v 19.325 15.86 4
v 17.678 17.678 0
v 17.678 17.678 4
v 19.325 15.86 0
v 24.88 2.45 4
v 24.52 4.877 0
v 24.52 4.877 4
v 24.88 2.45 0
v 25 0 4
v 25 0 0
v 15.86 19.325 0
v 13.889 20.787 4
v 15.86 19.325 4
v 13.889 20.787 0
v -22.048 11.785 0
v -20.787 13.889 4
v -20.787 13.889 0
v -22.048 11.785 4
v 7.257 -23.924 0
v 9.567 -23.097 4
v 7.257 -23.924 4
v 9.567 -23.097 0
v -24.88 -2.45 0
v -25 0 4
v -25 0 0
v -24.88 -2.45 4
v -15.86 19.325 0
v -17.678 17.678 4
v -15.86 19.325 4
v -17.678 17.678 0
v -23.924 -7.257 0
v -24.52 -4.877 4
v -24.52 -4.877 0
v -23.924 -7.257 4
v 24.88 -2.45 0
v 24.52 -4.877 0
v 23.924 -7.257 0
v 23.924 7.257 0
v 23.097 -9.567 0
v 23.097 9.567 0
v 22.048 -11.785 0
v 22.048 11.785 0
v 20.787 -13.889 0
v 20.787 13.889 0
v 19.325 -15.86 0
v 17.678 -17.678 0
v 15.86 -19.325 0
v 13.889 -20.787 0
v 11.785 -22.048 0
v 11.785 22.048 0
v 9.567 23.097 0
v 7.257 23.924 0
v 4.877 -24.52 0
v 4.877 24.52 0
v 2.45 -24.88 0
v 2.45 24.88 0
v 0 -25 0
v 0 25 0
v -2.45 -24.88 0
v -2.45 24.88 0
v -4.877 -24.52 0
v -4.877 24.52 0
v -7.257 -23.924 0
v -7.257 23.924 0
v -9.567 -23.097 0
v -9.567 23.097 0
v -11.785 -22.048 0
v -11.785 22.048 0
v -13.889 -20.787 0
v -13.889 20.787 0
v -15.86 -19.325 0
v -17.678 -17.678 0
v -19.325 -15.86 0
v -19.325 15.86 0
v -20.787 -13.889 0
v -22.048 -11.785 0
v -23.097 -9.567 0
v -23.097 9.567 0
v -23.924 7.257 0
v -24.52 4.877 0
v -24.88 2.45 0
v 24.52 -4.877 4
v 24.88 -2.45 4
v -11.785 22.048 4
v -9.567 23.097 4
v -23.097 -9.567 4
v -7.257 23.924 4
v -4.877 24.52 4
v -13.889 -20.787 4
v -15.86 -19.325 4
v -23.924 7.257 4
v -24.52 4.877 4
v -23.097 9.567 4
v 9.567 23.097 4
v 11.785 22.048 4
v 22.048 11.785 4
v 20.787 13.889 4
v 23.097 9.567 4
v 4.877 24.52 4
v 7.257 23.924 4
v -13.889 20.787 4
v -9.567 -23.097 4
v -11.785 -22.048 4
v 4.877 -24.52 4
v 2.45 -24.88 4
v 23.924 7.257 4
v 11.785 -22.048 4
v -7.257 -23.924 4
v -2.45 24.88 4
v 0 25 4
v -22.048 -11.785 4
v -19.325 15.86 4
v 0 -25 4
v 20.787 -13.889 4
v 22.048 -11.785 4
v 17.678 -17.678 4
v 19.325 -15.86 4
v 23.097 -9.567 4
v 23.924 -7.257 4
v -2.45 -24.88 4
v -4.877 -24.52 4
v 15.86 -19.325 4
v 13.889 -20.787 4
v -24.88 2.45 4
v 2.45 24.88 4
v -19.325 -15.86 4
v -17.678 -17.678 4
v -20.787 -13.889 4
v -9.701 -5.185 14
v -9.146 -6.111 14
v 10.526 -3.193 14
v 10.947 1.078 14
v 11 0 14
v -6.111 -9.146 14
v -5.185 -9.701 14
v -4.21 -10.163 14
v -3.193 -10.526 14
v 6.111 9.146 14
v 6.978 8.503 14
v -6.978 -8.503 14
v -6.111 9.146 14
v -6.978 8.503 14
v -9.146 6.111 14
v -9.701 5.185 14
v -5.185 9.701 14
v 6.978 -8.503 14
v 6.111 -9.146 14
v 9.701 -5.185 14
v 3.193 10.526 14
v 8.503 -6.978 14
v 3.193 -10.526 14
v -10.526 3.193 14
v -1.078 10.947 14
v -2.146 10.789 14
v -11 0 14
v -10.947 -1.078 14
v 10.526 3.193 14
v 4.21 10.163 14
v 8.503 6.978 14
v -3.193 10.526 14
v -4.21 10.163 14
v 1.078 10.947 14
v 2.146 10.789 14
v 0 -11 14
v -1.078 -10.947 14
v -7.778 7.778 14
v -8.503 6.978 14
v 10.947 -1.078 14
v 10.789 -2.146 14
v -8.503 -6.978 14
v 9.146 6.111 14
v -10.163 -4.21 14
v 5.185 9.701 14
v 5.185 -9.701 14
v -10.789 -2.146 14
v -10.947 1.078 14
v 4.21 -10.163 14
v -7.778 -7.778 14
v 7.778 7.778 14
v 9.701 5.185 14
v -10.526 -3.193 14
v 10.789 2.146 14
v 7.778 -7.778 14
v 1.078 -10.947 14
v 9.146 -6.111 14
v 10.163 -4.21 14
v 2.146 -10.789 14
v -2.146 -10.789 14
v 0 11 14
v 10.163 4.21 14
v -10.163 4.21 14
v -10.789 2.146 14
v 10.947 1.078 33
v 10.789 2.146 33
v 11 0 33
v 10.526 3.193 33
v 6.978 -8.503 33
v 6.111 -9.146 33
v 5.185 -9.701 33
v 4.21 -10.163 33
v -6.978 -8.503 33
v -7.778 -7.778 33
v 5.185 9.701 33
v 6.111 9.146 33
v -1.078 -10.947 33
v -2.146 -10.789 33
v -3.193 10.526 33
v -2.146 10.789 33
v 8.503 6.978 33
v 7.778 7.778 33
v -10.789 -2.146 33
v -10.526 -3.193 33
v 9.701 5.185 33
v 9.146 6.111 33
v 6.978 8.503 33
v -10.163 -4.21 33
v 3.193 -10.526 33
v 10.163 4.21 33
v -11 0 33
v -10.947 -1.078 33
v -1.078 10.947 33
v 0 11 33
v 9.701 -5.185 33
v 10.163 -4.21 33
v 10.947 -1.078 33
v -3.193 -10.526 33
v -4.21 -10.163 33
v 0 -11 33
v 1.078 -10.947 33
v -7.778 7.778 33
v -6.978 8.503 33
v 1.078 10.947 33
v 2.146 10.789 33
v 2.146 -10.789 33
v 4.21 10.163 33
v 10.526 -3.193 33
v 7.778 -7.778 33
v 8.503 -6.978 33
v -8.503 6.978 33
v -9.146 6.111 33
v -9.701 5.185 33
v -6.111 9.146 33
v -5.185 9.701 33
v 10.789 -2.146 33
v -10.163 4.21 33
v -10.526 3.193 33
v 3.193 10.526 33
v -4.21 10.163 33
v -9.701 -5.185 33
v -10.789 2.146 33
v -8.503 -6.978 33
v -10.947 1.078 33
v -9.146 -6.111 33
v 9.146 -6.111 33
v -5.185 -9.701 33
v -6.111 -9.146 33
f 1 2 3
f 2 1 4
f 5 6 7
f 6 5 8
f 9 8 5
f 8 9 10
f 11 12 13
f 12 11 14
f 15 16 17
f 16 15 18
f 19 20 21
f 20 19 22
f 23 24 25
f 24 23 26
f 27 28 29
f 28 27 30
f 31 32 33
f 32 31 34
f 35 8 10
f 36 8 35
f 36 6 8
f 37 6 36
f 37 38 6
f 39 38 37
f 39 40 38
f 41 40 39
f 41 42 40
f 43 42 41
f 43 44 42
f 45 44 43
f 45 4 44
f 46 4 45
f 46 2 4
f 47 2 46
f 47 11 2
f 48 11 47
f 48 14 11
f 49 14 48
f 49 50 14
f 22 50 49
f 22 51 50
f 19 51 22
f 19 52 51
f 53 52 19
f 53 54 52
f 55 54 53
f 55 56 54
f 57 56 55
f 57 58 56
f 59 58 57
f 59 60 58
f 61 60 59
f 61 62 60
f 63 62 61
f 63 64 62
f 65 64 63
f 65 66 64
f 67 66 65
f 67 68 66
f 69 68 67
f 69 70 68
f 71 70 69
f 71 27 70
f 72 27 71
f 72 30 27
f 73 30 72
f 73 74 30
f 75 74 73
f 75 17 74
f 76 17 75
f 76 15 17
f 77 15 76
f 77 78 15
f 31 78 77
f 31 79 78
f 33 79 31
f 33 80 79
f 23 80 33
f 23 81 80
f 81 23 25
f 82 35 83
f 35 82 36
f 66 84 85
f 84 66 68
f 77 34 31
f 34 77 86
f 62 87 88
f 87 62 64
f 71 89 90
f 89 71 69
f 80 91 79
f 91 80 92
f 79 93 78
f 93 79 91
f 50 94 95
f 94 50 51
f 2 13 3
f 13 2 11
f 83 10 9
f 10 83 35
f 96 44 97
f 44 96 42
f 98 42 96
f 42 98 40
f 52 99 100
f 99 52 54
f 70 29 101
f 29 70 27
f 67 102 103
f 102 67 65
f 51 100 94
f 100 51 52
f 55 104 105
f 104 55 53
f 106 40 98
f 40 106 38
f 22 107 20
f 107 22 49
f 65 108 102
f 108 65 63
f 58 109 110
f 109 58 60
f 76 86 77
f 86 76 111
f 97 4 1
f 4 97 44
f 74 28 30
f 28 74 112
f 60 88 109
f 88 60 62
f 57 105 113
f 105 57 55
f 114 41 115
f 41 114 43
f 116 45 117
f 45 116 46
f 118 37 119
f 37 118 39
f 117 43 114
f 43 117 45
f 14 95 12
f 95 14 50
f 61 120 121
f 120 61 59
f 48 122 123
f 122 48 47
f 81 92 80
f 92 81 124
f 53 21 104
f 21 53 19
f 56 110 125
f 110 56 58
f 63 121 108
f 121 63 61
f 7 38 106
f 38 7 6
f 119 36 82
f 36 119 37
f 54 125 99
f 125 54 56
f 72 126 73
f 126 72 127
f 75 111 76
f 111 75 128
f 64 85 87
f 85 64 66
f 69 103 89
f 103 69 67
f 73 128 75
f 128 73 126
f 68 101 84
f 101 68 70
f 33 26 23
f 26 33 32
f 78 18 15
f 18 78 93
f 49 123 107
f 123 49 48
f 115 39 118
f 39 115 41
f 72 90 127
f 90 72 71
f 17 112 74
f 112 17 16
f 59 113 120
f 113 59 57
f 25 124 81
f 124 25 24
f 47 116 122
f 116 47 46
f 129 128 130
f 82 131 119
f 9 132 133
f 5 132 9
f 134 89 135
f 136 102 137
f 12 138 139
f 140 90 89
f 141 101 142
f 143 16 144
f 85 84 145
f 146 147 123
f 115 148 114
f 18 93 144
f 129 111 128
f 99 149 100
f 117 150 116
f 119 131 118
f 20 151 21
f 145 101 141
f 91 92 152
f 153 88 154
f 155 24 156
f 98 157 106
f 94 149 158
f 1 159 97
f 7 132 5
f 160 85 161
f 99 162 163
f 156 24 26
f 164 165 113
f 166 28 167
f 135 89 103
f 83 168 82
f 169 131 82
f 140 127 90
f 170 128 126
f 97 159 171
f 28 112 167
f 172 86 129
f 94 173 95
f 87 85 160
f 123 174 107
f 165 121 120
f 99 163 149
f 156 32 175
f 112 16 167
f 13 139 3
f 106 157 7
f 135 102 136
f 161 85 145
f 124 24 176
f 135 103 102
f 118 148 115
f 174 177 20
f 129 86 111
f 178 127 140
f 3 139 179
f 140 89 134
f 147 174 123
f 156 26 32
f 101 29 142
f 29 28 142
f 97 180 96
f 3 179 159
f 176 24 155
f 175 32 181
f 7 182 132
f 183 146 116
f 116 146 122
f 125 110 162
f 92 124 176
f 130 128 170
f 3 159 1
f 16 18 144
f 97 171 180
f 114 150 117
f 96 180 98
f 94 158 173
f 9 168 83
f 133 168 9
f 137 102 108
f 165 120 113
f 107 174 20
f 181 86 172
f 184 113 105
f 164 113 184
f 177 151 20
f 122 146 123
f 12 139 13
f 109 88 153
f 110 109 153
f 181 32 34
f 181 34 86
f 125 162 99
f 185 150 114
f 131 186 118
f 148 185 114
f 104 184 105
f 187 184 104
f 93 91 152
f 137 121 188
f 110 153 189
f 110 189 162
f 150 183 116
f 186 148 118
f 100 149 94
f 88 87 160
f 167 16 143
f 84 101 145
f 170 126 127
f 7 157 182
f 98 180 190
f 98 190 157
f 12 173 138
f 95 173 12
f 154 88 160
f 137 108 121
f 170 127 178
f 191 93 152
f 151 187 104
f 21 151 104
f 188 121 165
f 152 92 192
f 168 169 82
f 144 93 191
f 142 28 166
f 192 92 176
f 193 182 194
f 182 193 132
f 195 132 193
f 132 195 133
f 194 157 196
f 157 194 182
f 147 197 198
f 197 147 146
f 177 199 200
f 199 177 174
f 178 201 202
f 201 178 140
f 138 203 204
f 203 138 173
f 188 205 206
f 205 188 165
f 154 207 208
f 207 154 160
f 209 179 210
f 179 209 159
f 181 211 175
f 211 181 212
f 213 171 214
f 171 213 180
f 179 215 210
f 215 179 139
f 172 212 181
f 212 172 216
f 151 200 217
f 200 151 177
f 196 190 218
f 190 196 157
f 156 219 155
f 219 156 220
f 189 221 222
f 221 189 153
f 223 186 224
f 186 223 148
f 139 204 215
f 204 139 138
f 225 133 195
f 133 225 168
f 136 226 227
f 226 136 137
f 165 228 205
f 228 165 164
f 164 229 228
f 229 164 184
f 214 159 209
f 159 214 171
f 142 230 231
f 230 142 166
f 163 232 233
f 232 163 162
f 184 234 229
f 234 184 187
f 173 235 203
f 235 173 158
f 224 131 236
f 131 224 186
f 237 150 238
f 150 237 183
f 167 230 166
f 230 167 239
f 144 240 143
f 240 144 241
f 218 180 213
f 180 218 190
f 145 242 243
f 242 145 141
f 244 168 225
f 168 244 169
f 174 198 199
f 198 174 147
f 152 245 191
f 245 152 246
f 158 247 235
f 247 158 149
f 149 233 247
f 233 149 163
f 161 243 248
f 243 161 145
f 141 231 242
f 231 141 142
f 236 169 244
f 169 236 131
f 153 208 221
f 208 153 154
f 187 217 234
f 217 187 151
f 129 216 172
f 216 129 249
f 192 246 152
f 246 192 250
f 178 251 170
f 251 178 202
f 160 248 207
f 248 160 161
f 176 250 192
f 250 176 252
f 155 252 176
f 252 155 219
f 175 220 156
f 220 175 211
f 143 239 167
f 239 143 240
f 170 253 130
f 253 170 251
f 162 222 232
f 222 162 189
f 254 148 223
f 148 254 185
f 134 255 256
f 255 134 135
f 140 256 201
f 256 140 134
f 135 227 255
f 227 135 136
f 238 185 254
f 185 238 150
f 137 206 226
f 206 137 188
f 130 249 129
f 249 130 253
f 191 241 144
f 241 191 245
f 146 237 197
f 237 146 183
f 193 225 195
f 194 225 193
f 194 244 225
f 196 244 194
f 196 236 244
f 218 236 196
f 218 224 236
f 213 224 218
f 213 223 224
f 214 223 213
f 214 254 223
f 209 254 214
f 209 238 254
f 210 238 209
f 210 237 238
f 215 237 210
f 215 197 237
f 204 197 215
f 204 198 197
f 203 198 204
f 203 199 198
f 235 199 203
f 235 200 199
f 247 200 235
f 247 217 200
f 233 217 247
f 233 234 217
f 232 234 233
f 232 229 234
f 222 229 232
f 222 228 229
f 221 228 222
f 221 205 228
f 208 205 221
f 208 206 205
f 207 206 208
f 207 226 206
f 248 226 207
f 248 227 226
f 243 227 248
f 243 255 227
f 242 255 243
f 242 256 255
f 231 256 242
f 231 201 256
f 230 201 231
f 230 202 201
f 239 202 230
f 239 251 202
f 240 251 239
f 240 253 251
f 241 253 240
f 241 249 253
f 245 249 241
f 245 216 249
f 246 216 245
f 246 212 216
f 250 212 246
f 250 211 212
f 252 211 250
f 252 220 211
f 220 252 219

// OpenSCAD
// Dimensions (mm) - measured with calipers
base_dia = 50;
base_h = 4;
cone_top_dia = 50;
cone_bot_dia = 22;
cone_h = 10; // z=4 to z=14
col_dia = 22;
col_h = 19; // z=14 to z=33
seat_dia = 11;
seat_h = 10; // z=33 down to z=23
tip_dia = 3;
tip_z = 6;
window_w = 4;
window_z1 = 18;
window_z2 = 30;

$fn = 64;

// Base disc
translate([0, 0, 0])
  cylinder(h = base_h, r = base_dia / 2, center = false);

// Cone from z=4 to z=14
translate([0, 0, base_h])
  cylinder(h = cone_h, r1 = cone_top_dia / 2, r2 = cone_bot_dia / 2, center = false);

// Column from z=14 to z=33
translate([0, 0, base_h + cone_h])
  cylinder(h = col_h, r = col_dia / 2, center = false);

// Tube seat (cylindrical part) from z=23 to z=33
translate([0, 0, tip_z + seat_h])
  cylinder(h = seat_h, r = seat_dia / 2, center = false);

// Tube seat (conical part) from z=6 to z=23
// This cone narrows from seat_dia at z=23 to tip_dia at z=6
cone_seat_h = 23 - tip_z;
translate([0, 0, tip_z])
  cylinder(h = cone_seat_h, r1 = tip_dia / 2, r2 = seat_dia / 2, center = false);

// Viewing window cutout on +X side
// The window is 4mm wide in Y, from z=18 to z=30
// It cuts through the column wall on the +X side
// Column radius is col_dia/2 = 11mm
// Window extends from the seat (r=5.5mm) to outside (r=11mm)
// The previous code used a cube which did not account for the hole inside the seat.
// We need to cut a slot that goes from the outer surface to the inner seat surface.
// The seat radius is seat_dia/2 = 5.5mm.
// The column radius is col_dia/2 = 11mm.
// The window is on the +X side.
// We create a difference to cut the window.

difference() {
    // Union of all solid parts
    union() {
        // Base disc
        translate([0, 0, 0])
          cylinder(h = base_h, r = base_dia / 2, center = false);

        // Cone from z=4 to z=14
        translate([0, 0, base_h])
          cylinder(h = cone_h, r1 = cone_top_dia / 2, r2 = cone_bot_dia / 2, center = false);

        // Column from z=14 to z=33
        translate([0, 0, base_h + cone_h])
          cylinder(h = col_h, r = col_dia / 2, center = false);

        // Tube seat (cylindrical part) from z=23 to z=33
        translate([0, 0, tip_z + seat_h])
          cylinder(h = seat_h, r = seat_dia / 2, center = false);

        // Tube seat (conical part) from z=6 to z=23
        translate([0, 0, tip_z])
          cylinder(h = cone_seat_h, r1 = tip_dia / 2, r2 = seat_dia / 2, center = false);
    }

    // Cut out the viewing window
    // The window is a slot on the +X side.
    // It spans Y from -window_w/2 to +window_w/2.
    // It spans Z from window_z1 to window_z2.
    // It spans X from the inner seat radius to the outer column radius + margin.
    // Inner radius = seat_dia/2 = 5.5
    // Outer radius = col_dia/2 = 11
    // We extend the cut slightly past the outer surface to ensure clean cut.
    
    translate([seat_dia / 2, -window_w / 2, window_z1])
      cube([col_dia / 2 - seat_dia / 2 + 1, window_w, window_z2 - window_z1 + 0.02]);
}
